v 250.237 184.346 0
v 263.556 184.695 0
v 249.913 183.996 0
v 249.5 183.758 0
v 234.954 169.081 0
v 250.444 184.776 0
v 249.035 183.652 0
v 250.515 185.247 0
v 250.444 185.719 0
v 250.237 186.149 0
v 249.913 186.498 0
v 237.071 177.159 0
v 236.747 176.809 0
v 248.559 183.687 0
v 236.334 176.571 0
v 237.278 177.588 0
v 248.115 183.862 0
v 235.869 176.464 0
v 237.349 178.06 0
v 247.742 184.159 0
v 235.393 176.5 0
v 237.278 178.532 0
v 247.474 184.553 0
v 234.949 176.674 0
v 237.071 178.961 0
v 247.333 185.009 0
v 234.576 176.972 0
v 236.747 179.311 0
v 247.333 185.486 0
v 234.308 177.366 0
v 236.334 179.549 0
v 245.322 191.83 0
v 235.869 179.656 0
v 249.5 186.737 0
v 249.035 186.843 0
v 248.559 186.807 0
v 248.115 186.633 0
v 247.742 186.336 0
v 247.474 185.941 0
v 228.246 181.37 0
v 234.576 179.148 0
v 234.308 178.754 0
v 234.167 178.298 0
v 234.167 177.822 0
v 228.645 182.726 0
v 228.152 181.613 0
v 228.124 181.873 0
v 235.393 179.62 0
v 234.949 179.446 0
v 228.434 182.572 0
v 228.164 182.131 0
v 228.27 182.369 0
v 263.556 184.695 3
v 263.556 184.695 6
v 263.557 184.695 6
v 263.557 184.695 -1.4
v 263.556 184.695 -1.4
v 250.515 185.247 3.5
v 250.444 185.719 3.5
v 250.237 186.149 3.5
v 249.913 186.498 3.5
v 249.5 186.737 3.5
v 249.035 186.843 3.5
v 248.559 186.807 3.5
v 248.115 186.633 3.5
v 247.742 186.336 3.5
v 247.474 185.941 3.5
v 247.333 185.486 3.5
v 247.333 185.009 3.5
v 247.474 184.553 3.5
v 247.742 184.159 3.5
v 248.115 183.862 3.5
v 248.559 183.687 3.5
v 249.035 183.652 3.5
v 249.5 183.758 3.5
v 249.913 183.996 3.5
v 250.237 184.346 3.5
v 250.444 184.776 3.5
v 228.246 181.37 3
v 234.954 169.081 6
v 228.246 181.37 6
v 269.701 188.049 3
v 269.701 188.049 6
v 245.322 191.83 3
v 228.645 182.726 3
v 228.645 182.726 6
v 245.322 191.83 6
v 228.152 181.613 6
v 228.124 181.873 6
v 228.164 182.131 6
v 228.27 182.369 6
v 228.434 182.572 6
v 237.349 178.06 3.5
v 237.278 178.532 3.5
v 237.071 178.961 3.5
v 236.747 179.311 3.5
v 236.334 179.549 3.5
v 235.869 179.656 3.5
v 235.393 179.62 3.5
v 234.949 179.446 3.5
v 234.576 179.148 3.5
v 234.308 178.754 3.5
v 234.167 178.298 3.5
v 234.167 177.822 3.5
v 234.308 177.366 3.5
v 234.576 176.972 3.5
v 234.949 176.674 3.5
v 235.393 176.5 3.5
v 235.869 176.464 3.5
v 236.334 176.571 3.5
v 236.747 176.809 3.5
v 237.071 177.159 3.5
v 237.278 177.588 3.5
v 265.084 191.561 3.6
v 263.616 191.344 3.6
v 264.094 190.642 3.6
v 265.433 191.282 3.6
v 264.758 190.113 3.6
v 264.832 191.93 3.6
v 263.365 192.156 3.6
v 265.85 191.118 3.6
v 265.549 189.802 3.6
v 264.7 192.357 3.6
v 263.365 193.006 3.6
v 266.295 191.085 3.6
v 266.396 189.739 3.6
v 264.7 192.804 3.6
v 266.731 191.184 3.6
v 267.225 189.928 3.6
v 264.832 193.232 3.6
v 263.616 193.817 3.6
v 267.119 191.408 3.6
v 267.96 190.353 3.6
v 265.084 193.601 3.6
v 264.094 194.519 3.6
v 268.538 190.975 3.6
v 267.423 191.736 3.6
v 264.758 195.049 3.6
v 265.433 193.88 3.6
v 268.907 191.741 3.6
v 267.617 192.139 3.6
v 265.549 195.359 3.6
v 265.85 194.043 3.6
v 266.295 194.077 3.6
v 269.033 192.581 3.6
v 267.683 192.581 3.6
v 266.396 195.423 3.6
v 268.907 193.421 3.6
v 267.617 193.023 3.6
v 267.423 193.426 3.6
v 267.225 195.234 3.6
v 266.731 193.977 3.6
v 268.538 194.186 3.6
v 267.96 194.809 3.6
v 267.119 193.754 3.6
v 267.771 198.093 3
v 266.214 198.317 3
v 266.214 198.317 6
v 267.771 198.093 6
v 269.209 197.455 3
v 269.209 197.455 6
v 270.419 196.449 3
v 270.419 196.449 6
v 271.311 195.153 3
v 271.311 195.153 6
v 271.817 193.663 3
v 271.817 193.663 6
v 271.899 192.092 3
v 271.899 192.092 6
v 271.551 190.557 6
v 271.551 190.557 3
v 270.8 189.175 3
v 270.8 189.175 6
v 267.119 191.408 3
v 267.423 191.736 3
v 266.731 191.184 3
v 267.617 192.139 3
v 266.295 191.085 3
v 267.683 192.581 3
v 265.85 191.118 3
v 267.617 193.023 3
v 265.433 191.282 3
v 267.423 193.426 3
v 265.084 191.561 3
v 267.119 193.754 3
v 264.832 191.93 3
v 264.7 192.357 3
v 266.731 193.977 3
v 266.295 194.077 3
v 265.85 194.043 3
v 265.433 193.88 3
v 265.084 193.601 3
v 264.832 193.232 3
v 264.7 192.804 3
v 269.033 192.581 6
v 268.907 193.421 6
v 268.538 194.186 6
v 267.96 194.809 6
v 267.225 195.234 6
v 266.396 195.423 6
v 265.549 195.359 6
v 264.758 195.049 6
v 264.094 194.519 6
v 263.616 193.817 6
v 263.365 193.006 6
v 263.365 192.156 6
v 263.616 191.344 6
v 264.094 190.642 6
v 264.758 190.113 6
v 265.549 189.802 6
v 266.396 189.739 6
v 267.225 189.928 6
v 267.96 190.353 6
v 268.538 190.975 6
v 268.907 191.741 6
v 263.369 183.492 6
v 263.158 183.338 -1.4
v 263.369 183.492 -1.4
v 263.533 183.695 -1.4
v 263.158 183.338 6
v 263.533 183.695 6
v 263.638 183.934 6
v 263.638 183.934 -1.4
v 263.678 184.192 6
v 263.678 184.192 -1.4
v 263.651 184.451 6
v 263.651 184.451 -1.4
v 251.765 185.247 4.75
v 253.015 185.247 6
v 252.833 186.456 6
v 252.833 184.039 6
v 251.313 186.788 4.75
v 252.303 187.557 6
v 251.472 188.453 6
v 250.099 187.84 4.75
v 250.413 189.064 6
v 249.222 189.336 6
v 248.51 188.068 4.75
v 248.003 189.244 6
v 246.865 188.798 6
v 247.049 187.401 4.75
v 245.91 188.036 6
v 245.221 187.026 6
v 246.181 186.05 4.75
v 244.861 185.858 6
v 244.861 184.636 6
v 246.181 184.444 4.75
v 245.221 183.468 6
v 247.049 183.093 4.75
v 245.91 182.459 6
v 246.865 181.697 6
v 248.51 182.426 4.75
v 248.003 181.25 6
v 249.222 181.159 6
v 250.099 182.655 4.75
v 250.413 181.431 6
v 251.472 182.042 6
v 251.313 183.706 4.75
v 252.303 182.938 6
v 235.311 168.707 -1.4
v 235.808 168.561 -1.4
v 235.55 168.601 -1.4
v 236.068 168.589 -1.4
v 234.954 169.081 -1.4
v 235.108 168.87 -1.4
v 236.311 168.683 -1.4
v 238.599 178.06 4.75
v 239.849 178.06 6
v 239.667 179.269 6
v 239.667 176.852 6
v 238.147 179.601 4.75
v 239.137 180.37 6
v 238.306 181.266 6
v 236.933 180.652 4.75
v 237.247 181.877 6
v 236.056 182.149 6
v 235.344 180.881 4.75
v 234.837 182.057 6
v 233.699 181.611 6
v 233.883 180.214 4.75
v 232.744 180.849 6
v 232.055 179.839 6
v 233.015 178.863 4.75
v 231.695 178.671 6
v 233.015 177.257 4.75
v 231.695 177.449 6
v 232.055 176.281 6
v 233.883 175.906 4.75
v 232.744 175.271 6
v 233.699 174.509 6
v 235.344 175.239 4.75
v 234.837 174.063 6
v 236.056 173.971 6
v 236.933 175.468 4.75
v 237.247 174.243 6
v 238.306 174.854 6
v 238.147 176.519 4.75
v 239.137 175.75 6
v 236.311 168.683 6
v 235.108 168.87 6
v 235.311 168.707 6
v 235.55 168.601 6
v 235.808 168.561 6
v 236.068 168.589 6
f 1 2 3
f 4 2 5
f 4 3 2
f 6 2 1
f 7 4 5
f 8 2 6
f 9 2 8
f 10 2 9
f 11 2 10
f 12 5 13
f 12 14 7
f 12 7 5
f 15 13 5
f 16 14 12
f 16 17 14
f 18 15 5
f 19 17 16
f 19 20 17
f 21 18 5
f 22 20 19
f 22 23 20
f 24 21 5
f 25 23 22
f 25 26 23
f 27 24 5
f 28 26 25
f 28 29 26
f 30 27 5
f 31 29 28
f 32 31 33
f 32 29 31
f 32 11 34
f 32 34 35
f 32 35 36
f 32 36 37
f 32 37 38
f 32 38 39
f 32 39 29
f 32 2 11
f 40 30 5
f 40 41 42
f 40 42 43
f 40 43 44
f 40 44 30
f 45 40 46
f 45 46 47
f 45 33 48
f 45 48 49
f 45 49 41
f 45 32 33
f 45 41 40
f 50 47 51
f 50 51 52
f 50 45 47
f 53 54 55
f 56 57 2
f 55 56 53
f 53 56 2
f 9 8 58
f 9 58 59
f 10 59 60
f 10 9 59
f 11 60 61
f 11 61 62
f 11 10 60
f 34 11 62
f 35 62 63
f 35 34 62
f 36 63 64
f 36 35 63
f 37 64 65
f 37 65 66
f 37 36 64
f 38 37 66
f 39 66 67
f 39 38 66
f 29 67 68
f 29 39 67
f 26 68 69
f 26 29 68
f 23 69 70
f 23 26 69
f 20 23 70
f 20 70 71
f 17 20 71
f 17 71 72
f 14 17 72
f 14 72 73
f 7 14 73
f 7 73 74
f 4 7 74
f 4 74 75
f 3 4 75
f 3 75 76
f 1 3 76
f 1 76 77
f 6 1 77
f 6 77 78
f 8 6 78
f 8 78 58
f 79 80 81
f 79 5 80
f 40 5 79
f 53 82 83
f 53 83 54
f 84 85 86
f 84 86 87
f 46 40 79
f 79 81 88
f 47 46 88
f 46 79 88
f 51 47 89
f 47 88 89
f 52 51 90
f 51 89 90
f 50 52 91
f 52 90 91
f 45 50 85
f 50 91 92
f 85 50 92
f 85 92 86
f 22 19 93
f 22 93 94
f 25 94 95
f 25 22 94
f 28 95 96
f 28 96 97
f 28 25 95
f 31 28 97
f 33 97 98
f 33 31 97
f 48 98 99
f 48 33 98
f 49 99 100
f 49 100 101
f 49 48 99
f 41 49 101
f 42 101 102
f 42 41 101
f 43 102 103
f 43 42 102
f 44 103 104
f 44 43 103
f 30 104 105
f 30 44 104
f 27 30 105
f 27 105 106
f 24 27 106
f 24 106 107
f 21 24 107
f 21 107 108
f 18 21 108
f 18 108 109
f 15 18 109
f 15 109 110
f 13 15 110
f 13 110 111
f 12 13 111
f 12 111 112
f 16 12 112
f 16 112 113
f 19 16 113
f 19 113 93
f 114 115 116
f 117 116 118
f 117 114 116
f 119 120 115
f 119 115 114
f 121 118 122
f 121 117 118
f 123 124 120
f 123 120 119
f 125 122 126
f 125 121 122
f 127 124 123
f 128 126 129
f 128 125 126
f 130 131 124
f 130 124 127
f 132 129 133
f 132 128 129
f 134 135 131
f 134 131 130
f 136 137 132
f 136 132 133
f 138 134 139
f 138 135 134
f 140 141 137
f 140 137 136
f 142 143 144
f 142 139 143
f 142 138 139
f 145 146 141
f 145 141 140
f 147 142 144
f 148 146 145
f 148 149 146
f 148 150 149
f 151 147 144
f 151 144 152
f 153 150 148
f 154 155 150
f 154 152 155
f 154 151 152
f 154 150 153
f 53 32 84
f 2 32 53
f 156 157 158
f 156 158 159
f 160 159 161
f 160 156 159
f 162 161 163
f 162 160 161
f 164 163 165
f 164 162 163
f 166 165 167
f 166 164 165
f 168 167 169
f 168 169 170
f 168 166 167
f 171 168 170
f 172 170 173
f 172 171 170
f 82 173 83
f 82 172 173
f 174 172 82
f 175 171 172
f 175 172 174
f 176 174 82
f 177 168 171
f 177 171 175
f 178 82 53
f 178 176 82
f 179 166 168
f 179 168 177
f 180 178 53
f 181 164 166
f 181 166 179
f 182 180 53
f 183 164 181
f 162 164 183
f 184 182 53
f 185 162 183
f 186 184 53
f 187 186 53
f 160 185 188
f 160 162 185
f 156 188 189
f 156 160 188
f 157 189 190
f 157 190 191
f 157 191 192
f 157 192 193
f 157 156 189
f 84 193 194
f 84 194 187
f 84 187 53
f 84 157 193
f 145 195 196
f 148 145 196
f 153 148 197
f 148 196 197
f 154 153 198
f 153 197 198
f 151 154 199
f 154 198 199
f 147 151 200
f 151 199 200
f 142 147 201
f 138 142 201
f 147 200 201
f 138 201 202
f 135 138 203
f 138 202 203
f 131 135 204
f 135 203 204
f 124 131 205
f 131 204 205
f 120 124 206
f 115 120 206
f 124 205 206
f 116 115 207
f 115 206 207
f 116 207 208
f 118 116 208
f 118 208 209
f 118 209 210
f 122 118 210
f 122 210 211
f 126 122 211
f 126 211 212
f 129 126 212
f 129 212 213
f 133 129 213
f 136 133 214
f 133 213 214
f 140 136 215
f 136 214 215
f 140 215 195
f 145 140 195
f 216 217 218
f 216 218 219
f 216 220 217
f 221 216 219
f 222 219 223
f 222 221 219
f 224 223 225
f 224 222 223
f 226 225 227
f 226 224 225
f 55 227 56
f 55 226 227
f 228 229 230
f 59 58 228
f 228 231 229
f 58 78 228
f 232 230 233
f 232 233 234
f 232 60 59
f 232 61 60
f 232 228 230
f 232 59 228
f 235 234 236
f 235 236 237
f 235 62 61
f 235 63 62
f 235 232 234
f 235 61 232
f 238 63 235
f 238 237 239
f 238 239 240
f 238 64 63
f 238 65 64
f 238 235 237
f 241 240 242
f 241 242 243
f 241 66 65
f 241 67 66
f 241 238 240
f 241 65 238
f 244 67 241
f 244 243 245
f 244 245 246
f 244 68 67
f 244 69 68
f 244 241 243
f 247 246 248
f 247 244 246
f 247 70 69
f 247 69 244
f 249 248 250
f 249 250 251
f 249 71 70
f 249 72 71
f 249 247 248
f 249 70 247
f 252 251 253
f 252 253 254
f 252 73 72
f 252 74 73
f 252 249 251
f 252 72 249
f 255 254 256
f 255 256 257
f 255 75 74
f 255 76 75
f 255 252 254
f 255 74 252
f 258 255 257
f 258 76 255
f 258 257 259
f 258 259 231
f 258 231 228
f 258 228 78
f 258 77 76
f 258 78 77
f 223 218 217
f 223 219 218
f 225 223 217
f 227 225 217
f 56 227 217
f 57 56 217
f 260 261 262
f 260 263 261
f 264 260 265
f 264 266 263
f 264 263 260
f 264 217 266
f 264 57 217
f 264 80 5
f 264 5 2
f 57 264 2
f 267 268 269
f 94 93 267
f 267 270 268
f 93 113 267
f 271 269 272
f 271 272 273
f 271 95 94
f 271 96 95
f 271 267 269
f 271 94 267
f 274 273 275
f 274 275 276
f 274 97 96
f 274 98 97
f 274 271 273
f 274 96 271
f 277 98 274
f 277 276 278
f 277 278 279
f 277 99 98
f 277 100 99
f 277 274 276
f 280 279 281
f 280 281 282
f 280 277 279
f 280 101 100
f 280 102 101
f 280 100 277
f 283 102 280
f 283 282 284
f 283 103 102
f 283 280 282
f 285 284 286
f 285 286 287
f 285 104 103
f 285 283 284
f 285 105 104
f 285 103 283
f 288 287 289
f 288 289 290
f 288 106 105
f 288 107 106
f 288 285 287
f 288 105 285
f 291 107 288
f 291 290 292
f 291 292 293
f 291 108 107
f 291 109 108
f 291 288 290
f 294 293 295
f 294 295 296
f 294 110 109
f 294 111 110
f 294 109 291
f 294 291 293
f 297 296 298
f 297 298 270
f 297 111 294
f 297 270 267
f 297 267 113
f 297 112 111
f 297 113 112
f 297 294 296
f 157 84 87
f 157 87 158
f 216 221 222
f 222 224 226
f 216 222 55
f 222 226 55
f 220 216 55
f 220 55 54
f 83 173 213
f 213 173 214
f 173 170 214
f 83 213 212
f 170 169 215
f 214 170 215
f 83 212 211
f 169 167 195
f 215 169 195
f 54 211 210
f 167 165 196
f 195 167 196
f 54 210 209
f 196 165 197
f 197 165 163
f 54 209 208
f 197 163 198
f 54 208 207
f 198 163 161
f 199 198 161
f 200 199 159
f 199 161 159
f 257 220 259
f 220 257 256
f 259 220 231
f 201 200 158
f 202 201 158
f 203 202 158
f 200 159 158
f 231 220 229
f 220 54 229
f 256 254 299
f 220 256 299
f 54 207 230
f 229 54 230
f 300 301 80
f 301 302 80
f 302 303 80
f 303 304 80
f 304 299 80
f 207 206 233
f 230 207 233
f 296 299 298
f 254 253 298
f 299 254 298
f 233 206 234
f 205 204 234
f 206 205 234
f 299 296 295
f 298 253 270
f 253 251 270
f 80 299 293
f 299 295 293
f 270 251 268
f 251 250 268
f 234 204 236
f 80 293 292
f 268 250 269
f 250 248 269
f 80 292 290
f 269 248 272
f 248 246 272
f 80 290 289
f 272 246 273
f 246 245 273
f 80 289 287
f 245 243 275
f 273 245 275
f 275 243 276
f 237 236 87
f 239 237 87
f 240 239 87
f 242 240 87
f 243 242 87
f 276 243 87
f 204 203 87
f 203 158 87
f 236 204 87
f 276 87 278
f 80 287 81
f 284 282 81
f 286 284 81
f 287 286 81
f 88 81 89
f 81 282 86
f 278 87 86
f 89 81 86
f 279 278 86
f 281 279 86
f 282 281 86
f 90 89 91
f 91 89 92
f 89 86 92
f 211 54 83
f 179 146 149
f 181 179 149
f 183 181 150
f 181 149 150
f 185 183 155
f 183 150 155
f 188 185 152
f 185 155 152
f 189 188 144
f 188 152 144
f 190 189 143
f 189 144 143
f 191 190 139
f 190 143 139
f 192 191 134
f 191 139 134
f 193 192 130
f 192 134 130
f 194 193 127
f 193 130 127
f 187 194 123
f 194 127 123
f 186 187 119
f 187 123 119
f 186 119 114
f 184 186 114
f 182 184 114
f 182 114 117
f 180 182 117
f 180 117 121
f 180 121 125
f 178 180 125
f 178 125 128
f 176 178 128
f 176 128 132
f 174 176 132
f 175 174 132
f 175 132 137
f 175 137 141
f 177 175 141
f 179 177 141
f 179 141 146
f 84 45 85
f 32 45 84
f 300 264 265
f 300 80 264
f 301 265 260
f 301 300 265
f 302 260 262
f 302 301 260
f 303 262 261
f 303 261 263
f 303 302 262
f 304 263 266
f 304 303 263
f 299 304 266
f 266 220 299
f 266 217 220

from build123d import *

# Parameters (mm, degrees)
SKETCH4_R           = 1.6
BOSS_EXTRUDE1_DEPTH = 3
BOSS_EXTRUDE2_DEPTH = 1.4
SKETCH6_R           = 1.6
BOSS_EXTRUDE3_DEPTH = 3
SKETCH7_R           = 2.85
CUT_EXTRUDE1_DEPTH  = 2.4
CUT_EXTRUDE2_DEPTH  = 4.6
SKETCH10_R          = 1.5
CUT_EXTRUDE3_DEPTH  = 10
CHAMFER1_SIZE       = 2.5
FILLET1_R           = 1


with BuildPart() as part:
    # Sketch4 → Boss-Extrude1 (new body)
    with BuildSketch(Plane.XY):
        Polygon((263.556481558, 184.695050819), (264.03563075, 183.817317345), (235.433373737, 168.203524869), (234.954224546, 169.081258344), (227.766986674, 182.247260462), (245.321656165, 191.830244291), align=None)
        with Locations((235.749272983, 178.06000536)):
            Circle(SKETCH4_R, mode=Mode.SUBTRACT)
        with Locations((248.915275101, 185.247243232)):
            Circle(SKETCH4_R, mode=Mode.SUBTRACT)
    extrude(amount=BOSS_EXTRUDE1_DEPTH)

    # Sketch5 → Boss-Extrude2 (add)
    with BuildSketch(Plane(origin=(0, 0, 0), x_dir=(-1, 0, 0), z_dir=(0, 0, -1))):
        Polygon((-263.556481558, 184.695050819), (-264.03563075, 183.817317345), (-235.433373737, 168.203524869), (-234.954224546, 169.081258344), align=None)
    extrude(amount=BOSS_EXTRUDE2_DEPTH)

    # Sketch6 → Boss-Extrude3 (add)
    with BuildSketch(Plane.XY.offset(3)):
        with BuildLine():
            Line((227.766986674, 182.247260462), (257.291019991, 198.364244833))
            Line((257.291019991, 198.364244833), (266.21359493, 198.317204861))
            ThreePointArc((266.21359493, 198.317204861), (271.61517707, 194.425420779), (269.70061588, 188.049095159))
            Line((269.70061588, 188.049095159), (263.556481558, 184.695050819))
            Line((263.556481558, 184.695050819), (264.03563075, 183.817317345))
            Line((264.03563075, 183.817317345), (235.433373737, 168.203524869))
            Line((235.433373737, 168.203524869), (234.954224546, 169.081258344))
            Line((234.954224546, 169.081258344), (227.766986674, 182.247260462))
        make_face()
        with Locations((248.915275101, 185.247243232)):
            Circle(SKETCH6_R, mode=Mode.SUBTRACT)
        with Locations((235.749272983, 178.06000536)):
            Circle(SKETCH6_R, mode=Mode.SUBTRACT)
    extrude(amount=BOSS_EXTRUDE3_DEPTH)

    # Sketch7 → Cut-Extrude1 (cut)
    with BuildSketch(Plane.XY.offset(6)):
        with Locations((266.183352442, 192.580788532)):
            Circle(SKETCH7_R)
    extrude(amount=-CUT_EXTRUDE1_DEPTH, mode=Mode.SUBTRACT)

    # Sketch9 → Cut-Extrude2 (cut)
    with BuildSketch(Plane(origin=(0, 0, 3), x_dir=(-1, 0, 0), z_dir=(0, 0, -1))):
        Polygon((-245.321656165, 191.830244291), (-266.21359493, 198.317204861), (-257.291019991, 198.364244833), align=None)
    extrude(amount=-CUT_EXTRUDE2_DEPTH, mode=Mode.SUBTRACT)

    # Sketch10 → Cut-Extrude3 (cut)
    with BuildSketch(Plane.XY.offset(3.6)):
        with Locations((266.183352442, 192.580788532)):
            Circle(SKETCH10_R)
    extrude(amount=-CUT_EXTRUDE3_DEPTH, mode=Mode.SUBTRACT)

    # Chamfer1
    chamfer1_edges = [part.edges().sort_by_distance(p)[0] for p in [
        (247.315275101, 185.247243232, 6),
        (234.149272983, 178.06000536, 6),
    ]]
    chamfer(chamfer1_edges, length=CHAMFER1_SIZE)

    # Fillet1
    fillet1_edges = [part.edges().sort_by_distance(p)[0] for p in [
        (264.03563075, 183.817317345, 2.3),
        (227.766986674, 182.247260462, 3),
        (235.433373737, 168.203524869, 2.3),
    ]]
    fillet(fillet1_edges, radius=FILLET1_R - 0.0001)  # a hair under: the kernel refuses the full size


solid = part.part
